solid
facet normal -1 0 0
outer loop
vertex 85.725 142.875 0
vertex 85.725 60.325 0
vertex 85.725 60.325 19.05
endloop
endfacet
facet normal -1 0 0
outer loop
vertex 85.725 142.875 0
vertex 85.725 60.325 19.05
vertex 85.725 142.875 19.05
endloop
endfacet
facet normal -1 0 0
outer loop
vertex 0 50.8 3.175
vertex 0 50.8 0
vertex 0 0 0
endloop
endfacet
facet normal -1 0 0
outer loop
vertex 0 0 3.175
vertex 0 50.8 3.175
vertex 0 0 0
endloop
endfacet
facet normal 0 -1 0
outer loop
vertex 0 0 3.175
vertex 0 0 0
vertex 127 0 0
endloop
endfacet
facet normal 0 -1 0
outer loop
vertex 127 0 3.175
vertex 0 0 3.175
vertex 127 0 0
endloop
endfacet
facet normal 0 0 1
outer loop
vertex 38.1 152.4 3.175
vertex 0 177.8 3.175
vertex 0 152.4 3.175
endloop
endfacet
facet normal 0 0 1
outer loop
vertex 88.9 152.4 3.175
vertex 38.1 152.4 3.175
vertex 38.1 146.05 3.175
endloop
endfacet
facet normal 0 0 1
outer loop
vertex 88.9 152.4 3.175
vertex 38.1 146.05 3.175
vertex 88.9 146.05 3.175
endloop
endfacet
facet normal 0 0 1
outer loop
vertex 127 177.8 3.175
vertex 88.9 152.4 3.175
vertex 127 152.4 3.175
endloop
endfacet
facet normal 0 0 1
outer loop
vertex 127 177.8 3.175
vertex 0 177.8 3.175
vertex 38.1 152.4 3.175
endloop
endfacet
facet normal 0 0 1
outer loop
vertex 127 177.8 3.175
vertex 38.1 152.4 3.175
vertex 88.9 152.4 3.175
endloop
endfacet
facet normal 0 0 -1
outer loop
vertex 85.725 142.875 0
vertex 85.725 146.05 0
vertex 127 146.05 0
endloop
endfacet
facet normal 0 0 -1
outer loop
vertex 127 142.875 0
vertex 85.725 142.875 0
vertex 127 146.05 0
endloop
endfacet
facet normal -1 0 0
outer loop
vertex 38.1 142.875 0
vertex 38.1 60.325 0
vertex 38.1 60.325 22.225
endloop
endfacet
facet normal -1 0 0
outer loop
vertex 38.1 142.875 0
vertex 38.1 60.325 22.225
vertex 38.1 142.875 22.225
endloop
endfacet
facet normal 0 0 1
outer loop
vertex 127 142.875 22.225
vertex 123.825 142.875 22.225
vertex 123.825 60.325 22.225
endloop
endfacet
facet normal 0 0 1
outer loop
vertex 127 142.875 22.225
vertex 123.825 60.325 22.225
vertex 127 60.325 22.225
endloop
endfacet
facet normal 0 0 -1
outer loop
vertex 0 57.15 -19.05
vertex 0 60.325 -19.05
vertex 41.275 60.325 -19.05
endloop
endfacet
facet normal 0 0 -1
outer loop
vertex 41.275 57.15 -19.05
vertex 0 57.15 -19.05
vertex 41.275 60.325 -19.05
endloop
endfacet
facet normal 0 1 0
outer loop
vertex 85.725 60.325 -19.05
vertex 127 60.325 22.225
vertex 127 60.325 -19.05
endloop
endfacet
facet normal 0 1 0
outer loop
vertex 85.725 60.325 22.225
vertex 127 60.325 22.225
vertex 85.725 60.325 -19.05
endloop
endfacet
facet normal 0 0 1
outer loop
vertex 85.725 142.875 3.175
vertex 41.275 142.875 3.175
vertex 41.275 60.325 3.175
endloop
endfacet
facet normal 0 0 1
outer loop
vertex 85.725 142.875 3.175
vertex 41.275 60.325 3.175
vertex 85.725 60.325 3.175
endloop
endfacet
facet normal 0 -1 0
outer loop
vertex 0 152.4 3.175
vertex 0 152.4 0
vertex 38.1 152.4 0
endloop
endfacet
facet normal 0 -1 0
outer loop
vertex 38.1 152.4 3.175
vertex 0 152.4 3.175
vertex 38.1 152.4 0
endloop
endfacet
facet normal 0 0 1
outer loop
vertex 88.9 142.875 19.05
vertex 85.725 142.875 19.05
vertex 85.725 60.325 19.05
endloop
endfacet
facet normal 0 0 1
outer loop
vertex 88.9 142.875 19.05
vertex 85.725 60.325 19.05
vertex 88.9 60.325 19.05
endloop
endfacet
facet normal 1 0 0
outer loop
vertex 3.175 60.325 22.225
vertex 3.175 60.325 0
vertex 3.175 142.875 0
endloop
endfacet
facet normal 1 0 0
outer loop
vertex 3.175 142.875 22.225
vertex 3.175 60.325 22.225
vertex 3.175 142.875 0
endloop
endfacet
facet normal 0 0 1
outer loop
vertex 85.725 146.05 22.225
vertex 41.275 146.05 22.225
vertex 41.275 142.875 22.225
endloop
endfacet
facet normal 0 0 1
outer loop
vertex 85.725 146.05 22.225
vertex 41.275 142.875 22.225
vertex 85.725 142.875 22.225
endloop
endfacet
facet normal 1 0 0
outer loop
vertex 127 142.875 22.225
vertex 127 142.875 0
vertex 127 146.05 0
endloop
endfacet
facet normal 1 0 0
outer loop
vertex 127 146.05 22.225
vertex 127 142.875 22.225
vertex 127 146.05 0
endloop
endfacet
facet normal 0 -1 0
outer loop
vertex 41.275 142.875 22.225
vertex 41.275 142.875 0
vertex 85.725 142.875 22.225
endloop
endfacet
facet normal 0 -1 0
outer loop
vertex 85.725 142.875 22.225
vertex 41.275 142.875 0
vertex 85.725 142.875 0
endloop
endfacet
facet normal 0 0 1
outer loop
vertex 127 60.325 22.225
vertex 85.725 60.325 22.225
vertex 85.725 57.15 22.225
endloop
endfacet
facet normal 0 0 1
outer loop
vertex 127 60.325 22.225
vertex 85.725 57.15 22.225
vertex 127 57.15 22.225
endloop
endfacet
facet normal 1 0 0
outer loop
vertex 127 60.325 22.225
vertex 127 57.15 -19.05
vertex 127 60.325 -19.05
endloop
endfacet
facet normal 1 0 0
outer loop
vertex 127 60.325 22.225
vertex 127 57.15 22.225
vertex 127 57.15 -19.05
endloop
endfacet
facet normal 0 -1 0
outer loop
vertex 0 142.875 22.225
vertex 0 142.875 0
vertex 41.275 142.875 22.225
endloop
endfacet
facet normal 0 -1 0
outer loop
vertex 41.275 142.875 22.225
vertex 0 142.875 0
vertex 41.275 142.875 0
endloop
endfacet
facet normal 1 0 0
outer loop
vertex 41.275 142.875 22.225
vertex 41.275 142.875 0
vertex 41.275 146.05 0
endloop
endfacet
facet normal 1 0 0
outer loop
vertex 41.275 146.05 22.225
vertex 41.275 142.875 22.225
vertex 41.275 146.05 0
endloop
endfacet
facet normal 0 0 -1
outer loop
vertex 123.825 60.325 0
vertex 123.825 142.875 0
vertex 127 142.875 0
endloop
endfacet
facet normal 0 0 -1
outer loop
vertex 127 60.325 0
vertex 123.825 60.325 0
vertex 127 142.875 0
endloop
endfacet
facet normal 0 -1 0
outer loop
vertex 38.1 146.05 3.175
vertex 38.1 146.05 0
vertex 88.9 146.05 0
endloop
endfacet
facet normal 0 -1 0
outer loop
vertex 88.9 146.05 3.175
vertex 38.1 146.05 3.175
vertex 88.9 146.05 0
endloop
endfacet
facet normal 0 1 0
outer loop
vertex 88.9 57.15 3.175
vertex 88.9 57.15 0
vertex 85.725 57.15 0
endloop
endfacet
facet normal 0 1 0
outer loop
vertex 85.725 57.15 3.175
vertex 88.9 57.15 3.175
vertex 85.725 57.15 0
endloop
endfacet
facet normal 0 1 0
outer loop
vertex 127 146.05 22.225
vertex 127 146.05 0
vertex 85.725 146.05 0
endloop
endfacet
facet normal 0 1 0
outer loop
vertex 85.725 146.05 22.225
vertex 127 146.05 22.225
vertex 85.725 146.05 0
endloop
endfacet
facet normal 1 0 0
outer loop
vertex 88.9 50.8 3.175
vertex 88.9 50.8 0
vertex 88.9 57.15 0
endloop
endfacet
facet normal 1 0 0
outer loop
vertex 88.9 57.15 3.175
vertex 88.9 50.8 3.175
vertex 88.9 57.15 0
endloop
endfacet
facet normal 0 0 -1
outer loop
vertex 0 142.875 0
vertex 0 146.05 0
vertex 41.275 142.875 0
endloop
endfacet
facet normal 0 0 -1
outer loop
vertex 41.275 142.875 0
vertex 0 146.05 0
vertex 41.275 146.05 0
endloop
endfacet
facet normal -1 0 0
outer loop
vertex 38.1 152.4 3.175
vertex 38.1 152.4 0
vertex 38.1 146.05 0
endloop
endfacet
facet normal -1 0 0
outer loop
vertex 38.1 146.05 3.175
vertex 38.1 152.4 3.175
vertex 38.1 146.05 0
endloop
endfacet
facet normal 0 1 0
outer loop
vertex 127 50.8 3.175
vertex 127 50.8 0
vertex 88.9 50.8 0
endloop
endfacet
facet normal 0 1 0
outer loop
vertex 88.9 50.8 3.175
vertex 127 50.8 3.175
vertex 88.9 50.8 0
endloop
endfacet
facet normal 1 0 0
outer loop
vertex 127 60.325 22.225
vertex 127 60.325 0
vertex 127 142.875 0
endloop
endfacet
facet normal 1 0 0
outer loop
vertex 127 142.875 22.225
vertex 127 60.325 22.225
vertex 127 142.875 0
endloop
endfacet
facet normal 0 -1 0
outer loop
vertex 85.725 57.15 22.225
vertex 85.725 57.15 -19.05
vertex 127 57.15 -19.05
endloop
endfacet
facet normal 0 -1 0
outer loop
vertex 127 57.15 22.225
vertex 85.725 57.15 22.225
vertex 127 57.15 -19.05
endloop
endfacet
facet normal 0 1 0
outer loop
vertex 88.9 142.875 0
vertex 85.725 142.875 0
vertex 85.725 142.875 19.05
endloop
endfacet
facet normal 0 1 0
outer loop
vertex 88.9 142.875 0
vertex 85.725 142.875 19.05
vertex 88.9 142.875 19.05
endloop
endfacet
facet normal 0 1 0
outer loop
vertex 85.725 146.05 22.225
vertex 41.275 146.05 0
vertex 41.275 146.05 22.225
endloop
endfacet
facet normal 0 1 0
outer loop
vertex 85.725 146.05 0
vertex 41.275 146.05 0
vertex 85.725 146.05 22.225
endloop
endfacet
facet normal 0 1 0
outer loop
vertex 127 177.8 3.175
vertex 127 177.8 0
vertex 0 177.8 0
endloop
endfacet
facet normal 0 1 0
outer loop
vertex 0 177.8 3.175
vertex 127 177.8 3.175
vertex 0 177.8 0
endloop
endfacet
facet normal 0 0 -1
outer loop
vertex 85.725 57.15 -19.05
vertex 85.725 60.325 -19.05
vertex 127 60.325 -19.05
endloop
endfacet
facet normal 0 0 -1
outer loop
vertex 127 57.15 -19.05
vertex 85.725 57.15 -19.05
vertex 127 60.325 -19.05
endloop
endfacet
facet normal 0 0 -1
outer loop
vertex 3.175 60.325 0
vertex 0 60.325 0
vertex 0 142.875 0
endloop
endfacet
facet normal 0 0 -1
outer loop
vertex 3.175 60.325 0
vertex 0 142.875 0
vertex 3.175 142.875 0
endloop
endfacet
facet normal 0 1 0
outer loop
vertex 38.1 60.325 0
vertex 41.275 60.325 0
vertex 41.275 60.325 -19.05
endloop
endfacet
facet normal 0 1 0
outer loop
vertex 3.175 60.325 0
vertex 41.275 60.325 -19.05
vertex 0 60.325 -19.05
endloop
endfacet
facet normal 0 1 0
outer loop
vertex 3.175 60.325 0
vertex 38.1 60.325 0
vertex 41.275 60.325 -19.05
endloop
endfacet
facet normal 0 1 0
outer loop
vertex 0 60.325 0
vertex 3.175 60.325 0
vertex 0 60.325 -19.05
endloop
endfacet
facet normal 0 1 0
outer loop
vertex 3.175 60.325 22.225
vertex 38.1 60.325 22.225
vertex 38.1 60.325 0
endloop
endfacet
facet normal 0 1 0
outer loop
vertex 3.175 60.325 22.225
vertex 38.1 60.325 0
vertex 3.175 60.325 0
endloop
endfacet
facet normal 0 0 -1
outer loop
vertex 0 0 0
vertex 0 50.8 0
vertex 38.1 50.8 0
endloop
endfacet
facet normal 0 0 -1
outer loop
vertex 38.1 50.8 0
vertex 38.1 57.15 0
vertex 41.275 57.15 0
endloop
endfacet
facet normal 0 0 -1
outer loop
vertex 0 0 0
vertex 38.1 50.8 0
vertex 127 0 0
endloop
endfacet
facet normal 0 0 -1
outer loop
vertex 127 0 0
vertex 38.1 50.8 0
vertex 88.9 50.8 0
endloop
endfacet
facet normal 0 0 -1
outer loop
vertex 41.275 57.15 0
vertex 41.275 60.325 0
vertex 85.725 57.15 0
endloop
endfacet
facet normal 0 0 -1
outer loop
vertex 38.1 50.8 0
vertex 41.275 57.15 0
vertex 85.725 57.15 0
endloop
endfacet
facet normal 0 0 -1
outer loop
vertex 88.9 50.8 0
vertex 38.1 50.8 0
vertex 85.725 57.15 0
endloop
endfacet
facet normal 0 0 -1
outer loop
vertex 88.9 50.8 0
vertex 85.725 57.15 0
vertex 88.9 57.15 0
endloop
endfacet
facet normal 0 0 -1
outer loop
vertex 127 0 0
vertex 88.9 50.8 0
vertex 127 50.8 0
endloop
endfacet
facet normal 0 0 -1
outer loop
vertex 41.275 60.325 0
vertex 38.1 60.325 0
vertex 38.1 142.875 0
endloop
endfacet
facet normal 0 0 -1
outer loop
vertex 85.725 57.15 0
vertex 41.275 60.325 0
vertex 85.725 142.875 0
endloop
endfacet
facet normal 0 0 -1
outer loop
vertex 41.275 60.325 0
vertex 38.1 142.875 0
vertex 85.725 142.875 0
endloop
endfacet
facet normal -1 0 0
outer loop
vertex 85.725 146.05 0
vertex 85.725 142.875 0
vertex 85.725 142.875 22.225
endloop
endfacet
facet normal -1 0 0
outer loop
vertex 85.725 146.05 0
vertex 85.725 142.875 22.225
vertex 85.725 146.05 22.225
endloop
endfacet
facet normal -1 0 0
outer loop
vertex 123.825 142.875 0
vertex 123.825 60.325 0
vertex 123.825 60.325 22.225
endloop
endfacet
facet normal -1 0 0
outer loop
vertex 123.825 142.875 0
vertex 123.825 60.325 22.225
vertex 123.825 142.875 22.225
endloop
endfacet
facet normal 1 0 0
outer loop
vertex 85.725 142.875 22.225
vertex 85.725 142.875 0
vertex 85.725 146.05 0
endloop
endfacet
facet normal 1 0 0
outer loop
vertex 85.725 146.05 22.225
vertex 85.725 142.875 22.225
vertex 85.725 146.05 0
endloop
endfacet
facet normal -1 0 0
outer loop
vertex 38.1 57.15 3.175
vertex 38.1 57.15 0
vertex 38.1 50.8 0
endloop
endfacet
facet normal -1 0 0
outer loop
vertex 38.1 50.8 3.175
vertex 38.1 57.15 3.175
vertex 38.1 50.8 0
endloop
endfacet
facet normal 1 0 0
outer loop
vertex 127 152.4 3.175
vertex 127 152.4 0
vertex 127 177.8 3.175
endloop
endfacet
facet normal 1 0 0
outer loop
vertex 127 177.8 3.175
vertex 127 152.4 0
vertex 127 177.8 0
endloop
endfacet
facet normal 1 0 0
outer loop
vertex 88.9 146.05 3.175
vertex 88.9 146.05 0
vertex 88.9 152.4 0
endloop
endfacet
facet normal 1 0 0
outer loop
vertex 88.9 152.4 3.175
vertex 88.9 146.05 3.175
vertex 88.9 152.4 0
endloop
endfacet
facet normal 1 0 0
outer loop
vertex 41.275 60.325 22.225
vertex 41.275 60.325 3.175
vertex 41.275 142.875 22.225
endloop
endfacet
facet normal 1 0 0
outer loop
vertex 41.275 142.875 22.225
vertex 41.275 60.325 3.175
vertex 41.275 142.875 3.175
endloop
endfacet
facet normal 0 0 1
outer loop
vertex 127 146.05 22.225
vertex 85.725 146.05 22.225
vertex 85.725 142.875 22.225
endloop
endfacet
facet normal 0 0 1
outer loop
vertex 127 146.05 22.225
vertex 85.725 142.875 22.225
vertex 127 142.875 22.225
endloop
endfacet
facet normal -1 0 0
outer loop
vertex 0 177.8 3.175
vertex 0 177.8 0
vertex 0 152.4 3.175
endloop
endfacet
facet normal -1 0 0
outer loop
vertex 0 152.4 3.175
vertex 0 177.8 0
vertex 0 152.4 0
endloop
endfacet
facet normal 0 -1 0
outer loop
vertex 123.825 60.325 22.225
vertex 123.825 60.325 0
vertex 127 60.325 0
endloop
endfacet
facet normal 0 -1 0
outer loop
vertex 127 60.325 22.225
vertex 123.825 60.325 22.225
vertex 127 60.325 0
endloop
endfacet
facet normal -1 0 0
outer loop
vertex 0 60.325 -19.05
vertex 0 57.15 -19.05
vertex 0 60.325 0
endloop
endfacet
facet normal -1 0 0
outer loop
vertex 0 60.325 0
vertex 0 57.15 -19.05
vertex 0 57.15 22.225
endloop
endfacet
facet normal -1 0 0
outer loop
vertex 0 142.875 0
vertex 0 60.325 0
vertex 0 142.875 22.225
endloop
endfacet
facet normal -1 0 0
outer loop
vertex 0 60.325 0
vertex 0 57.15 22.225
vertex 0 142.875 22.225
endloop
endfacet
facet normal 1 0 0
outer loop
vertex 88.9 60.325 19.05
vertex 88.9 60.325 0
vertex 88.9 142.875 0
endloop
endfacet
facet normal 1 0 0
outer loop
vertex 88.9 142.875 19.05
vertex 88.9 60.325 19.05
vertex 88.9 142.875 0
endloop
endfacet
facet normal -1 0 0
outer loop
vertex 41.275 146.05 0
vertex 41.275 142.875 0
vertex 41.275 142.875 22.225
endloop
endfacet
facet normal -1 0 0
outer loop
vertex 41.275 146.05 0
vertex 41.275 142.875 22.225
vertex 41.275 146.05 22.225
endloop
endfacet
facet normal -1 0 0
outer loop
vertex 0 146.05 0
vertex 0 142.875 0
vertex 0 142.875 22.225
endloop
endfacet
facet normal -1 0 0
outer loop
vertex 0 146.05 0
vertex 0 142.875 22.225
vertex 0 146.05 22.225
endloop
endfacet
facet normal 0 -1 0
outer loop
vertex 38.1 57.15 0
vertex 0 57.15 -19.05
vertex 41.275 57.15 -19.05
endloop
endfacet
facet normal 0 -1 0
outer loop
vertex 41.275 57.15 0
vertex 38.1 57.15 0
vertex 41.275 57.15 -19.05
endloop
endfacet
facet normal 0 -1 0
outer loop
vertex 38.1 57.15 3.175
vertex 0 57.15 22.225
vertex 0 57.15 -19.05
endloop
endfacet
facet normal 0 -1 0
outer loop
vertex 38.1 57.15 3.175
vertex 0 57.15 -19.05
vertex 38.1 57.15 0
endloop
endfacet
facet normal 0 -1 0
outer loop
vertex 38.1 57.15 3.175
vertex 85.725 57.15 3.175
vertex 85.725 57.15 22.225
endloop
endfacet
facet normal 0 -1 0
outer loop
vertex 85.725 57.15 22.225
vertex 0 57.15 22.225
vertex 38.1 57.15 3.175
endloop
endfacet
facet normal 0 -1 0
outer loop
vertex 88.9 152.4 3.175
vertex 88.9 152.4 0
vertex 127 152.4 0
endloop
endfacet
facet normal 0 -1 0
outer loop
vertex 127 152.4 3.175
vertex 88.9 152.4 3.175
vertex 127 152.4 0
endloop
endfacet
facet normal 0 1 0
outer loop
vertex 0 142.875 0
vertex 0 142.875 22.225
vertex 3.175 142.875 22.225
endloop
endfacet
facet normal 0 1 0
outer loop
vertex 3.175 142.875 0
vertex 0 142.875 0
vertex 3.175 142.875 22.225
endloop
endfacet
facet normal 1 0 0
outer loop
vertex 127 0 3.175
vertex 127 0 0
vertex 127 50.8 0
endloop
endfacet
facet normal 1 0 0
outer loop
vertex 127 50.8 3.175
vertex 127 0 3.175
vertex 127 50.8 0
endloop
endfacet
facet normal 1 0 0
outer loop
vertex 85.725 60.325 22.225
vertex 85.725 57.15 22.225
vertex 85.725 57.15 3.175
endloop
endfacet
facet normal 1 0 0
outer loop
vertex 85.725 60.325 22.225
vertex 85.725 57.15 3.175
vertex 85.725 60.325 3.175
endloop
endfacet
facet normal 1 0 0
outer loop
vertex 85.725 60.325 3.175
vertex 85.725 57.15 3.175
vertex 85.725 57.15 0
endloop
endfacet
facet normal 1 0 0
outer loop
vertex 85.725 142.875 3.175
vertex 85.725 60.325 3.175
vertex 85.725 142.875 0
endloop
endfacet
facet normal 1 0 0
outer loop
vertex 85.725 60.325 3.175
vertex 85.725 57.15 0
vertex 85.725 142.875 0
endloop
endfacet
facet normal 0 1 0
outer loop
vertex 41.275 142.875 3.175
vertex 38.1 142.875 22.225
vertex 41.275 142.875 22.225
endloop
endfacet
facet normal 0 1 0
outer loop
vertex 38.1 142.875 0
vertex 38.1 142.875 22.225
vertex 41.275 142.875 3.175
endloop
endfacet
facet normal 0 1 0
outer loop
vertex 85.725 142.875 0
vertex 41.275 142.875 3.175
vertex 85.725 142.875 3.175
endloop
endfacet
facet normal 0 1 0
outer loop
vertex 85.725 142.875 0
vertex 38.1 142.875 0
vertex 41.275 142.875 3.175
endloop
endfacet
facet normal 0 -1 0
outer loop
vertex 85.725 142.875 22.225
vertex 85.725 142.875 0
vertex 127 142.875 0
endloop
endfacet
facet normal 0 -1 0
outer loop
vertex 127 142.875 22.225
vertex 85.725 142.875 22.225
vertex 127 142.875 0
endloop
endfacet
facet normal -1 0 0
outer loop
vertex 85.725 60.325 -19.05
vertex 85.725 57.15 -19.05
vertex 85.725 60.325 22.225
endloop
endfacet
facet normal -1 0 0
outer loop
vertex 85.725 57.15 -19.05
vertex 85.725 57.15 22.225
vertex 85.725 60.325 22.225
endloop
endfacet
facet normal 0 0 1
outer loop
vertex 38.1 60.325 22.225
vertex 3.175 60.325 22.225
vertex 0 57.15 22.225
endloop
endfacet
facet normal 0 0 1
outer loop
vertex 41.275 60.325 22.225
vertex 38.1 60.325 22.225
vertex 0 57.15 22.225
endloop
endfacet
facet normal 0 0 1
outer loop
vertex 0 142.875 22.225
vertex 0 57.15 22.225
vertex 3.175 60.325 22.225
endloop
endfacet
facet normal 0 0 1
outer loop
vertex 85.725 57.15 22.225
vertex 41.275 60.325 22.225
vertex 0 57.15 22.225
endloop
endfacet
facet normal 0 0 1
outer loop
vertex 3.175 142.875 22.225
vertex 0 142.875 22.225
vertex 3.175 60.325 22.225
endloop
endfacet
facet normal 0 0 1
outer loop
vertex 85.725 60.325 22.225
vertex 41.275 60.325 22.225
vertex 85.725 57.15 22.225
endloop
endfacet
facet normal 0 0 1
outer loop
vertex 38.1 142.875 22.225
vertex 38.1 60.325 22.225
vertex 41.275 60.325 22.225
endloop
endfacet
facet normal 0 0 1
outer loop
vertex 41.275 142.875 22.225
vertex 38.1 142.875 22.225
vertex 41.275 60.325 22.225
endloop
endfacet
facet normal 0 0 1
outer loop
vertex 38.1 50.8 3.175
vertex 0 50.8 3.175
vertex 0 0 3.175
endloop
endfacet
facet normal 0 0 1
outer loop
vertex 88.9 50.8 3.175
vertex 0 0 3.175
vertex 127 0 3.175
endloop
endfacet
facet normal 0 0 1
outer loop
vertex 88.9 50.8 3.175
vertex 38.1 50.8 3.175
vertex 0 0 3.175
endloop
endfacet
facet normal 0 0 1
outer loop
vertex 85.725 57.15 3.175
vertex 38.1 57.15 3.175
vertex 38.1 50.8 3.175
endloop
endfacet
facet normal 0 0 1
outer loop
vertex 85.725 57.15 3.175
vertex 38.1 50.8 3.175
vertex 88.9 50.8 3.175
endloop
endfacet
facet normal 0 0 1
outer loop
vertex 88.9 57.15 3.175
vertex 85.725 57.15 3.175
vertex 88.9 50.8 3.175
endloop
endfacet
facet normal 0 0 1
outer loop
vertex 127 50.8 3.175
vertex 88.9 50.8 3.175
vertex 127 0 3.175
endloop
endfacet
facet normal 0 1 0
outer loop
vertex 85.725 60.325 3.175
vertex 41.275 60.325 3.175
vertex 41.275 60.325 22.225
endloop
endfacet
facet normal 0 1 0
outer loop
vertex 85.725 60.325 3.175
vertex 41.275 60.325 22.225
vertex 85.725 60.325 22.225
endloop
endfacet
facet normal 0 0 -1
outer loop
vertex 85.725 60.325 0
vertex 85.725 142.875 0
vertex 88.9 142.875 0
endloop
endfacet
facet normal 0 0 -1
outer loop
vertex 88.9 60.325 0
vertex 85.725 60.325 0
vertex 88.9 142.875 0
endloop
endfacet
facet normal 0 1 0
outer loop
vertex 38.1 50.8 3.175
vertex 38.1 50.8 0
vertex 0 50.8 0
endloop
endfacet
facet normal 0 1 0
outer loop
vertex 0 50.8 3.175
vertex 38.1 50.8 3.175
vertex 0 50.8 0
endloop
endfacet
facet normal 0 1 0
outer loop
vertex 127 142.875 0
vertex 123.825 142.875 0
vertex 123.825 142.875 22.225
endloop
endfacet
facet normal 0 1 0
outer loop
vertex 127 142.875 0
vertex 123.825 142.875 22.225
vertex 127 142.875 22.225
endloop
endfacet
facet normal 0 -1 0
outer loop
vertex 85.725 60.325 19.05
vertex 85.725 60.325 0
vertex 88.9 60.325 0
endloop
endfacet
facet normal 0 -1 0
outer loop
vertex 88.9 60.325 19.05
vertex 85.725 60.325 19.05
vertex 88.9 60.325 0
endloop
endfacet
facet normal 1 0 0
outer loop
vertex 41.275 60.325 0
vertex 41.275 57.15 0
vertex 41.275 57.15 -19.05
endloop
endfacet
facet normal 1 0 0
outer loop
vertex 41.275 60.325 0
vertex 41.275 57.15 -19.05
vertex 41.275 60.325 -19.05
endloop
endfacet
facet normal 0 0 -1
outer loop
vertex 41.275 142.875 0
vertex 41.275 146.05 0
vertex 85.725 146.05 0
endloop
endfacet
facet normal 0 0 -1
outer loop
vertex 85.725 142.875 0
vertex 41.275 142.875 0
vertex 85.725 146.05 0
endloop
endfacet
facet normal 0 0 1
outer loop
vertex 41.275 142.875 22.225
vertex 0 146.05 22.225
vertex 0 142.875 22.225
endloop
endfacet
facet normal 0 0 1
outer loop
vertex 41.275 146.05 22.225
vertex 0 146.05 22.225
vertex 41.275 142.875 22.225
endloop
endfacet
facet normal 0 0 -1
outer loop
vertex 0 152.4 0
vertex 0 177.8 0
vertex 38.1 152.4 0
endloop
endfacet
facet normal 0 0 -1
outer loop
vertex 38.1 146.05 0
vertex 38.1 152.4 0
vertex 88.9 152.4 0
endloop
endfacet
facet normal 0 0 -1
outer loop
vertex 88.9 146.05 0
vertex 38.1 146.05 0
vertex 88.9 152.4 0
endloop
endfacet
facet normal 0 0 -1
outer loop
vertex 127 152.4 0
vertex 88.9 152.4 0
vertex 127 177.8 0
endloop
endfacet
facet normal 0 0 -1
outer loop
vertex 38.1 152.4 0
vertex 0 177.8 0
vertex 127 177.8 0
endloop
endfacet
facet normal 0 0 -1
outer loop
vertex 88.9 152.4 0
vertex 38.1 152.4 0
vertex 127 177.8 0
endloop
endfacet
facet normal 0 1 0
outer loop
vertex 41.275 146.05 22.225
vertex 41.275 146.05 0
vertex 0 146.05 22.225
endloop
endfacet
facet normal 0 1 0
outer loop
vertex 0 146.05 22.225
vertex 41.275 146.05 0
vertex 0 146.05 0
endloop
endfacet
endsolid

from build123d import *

# Parameters (mm, degrees)
F1_DEPTH  = 3.175
F0_W      = 44.45
F0_H      = 82.55
F0_W_2    = 34.925
F0_H_2    = 3.175
F0_W_3    = 3.175
F2_DEPTH  = 22.225
F3_DEPTH  = 22.225
F4_DEPTH  = 19.05
F5_DEPTH  = 22.225
F6_DEPTH  = 22.225
F7_DEPTH  = 22.225
F8_DEPTH  = 22.225
F9_DEPTH  = 22.225
F10_DEPTH = 22.225
F11_DEPTH = 22.225
F12_DEPTH = 19.05
F13_DEPTH = 19.05


with BuildPart() as f1:
    # F0 (on Top) → F1 (new body)
    with BuildSketch(Plane.XY):
        Polygon((0, 50.8), (0, 0), (127, 0), (127, 50.8), (88.9, 50.8), (88.9, 57.15), (85.725, 57.15), (41.275, 57.15), (38.1, 57.15), (38.1, 50.8), align=None)
    extrude(amount=F1_DEPTH)



with BuildPart() as f1b:
    # F0 (on Top) → F1, piece 2 (new body)
    with BuildSketch(Plane.XY):
        Polygon((0, 177.8), (0, 152.4), (38.1, 152.4), (38.1, 146.05), (41.275, 146.05), (85.725, 146.05), (88.9, 146.05), (88.9, 152.4), (127, 152.4), (127, 177.8), align=None)
    extrude(amount=F1_DEPTH)


with BuildPart() as f1c:
    # F0 (on Top) → F1, piece 3 (new body)
    with BuildSketch(Plane.XY):
        with Locations((63.5, 101.6)):
            Rectangle(F0_W, F0_H)
    extrude(amount=F1_DEPTH)


with BuildPart() as f2:
    # F0 (on Top) → F2 (new body)
    with BuildSketch(Plane.XY):
        with Locations((106.3625, 58.7375)):
            Rectangle(F0_W_2, F0_H_2)
        with Locations((125.4125, 58.7375)):
            Rectangle(F0_W_3, F0_H_2)
        with Locations((87.3125, 58.7375)):
            Rectangle(F0_W_3, F0_H_2)
    extrude(amount=F2_DEPTH)

    # F12 (add): a face of the model
    f12_faces = [f2.faces().sort_by_distance(p)[0] for p in [
        (106.3625, 58.7375, 0),
    ]]
    extrude(f12_faces, amount=F12_DEPTH)


with BuildPart() as f3:
    # F0 (on Top) → F3 (new body)
    with BuildSketch(Plane.XY):
        with Locations((125.4125, 101.6)):
            Rectangle(F0_W_3, F0_H)
    extrude(amount=F3_DEPTH)


with BuildPart() as f4:
    # F0 (on Top) → F4 (new body)
    with BuildSketch(Plane.XY):
        with Locations((87.3125, 101.6)):
            Rectangle(F0_W_3, F0_H)
    extrude(amount=F4_DEPTH)


with BuildPart() as f5:
    # F0 (on Top) → F5 (new body)
    with BuildSketch(Plane.XY):
        with Locations((125.4125, 144.4625)):
            Rectangle(F0_W_3, F0_H_2)
        with Locations((106.3625, 144.4625)):
            Rectangle(F0_W_2, F0_H_2)
        with Locations((87.3125, 144.4625)):
            Rectangle(F0_W_3, F0_H_2)
    extrude(amount=F5_DEPTH)


with BuildPart() as f6:
    # F0 (on Top) → F6 (new body)
    with BuildSketch(Plane.XY):
        with Locations((1.5875, 144.4625)):
            Rectangle(F0_W_3, F0_H_2)
        with Locations((20.6375, 144.4625)):
            Rectangle(F0_W_2, F0_H_2)
        with Locations((39.6875, 144.4625)):
            Rectangle(F0_W_3, F0_H_2)
    extrude(amount=F6_DEPTH)


with BuildPart() as f7:
    # F0 (on Top) → F7 (new body)
    with BuildSketch(Plane.XY):
        with Locations((63.5, 144.4625)):
            Rectangle(F0_W, F0_H_2)
    extrude(amount=F7_DEPTH)


with BuildPart() as f8:
    # F0 (on Top) → F8 (new body)
    with BuildSketch(Plane.XY):
        with Locations((1.5875, 101.6)):
            Rectangle(F0_W_3, F0_H)
    extrude(amount=F8_DEPTH)


with BuildPart() as f9:
    # F0 (on Top) → F9 (new body)
    with BuildSketch(Plane.XY):
        with Locations((39.6875, 101.6)):
            Rectangle(F0_W_3, F0_H)
    extrude(amount=F9_DEPTH)


with BuildPart() as f10:
    # F0 (on Top) → F10 (new body)
    with BuildSketch(Plane.XY):
        with Locations((1.5875, 58.7375)):
            Rectangle(F0_W_3, F0_H_2)
        with Locations((20.6375, 58.7375)):
            Rectangle(F0_W_2, F0_H_2)
        with Locations((39.6875, 58.7375)):
            Rectangle(F0_W_3, F0_H_2)
    extrude(amount=F10_DEPTH)


with BuildPart() as f11:
    # F0 (on Top) → F11 (new body)
    with BuildSketch(Plane.XY):
        with Locations((63.5, 58.7375)):
            Rectangle(F0_W, F0_H_2)
    extrude(amount=F11_DEPTH)


with BuildPart() as f1_1:
    add(f1.part)
    # F13 (add): a face of the model
    f13_faces = [f10.part.faces().sort_by_distance(p)[0] for p in [
        (20.6375, 58.7375, 0),
    ]]

    add(f1c.part)  # F13 merges F1c

    add(f8.part)  # F13 merges F8

    add(f9.part)  # F13 merges F9

    add(f10.part)  # F13 merges F10

    add(f11.part)  # F13 merges F11
    extrude(f13_faces, amount=F13_DEPTH)


solid = Compound([f1b.part, f2.part, f3.part, f4.part, f5.part, f6.part, f7.part, f1_1.part])
